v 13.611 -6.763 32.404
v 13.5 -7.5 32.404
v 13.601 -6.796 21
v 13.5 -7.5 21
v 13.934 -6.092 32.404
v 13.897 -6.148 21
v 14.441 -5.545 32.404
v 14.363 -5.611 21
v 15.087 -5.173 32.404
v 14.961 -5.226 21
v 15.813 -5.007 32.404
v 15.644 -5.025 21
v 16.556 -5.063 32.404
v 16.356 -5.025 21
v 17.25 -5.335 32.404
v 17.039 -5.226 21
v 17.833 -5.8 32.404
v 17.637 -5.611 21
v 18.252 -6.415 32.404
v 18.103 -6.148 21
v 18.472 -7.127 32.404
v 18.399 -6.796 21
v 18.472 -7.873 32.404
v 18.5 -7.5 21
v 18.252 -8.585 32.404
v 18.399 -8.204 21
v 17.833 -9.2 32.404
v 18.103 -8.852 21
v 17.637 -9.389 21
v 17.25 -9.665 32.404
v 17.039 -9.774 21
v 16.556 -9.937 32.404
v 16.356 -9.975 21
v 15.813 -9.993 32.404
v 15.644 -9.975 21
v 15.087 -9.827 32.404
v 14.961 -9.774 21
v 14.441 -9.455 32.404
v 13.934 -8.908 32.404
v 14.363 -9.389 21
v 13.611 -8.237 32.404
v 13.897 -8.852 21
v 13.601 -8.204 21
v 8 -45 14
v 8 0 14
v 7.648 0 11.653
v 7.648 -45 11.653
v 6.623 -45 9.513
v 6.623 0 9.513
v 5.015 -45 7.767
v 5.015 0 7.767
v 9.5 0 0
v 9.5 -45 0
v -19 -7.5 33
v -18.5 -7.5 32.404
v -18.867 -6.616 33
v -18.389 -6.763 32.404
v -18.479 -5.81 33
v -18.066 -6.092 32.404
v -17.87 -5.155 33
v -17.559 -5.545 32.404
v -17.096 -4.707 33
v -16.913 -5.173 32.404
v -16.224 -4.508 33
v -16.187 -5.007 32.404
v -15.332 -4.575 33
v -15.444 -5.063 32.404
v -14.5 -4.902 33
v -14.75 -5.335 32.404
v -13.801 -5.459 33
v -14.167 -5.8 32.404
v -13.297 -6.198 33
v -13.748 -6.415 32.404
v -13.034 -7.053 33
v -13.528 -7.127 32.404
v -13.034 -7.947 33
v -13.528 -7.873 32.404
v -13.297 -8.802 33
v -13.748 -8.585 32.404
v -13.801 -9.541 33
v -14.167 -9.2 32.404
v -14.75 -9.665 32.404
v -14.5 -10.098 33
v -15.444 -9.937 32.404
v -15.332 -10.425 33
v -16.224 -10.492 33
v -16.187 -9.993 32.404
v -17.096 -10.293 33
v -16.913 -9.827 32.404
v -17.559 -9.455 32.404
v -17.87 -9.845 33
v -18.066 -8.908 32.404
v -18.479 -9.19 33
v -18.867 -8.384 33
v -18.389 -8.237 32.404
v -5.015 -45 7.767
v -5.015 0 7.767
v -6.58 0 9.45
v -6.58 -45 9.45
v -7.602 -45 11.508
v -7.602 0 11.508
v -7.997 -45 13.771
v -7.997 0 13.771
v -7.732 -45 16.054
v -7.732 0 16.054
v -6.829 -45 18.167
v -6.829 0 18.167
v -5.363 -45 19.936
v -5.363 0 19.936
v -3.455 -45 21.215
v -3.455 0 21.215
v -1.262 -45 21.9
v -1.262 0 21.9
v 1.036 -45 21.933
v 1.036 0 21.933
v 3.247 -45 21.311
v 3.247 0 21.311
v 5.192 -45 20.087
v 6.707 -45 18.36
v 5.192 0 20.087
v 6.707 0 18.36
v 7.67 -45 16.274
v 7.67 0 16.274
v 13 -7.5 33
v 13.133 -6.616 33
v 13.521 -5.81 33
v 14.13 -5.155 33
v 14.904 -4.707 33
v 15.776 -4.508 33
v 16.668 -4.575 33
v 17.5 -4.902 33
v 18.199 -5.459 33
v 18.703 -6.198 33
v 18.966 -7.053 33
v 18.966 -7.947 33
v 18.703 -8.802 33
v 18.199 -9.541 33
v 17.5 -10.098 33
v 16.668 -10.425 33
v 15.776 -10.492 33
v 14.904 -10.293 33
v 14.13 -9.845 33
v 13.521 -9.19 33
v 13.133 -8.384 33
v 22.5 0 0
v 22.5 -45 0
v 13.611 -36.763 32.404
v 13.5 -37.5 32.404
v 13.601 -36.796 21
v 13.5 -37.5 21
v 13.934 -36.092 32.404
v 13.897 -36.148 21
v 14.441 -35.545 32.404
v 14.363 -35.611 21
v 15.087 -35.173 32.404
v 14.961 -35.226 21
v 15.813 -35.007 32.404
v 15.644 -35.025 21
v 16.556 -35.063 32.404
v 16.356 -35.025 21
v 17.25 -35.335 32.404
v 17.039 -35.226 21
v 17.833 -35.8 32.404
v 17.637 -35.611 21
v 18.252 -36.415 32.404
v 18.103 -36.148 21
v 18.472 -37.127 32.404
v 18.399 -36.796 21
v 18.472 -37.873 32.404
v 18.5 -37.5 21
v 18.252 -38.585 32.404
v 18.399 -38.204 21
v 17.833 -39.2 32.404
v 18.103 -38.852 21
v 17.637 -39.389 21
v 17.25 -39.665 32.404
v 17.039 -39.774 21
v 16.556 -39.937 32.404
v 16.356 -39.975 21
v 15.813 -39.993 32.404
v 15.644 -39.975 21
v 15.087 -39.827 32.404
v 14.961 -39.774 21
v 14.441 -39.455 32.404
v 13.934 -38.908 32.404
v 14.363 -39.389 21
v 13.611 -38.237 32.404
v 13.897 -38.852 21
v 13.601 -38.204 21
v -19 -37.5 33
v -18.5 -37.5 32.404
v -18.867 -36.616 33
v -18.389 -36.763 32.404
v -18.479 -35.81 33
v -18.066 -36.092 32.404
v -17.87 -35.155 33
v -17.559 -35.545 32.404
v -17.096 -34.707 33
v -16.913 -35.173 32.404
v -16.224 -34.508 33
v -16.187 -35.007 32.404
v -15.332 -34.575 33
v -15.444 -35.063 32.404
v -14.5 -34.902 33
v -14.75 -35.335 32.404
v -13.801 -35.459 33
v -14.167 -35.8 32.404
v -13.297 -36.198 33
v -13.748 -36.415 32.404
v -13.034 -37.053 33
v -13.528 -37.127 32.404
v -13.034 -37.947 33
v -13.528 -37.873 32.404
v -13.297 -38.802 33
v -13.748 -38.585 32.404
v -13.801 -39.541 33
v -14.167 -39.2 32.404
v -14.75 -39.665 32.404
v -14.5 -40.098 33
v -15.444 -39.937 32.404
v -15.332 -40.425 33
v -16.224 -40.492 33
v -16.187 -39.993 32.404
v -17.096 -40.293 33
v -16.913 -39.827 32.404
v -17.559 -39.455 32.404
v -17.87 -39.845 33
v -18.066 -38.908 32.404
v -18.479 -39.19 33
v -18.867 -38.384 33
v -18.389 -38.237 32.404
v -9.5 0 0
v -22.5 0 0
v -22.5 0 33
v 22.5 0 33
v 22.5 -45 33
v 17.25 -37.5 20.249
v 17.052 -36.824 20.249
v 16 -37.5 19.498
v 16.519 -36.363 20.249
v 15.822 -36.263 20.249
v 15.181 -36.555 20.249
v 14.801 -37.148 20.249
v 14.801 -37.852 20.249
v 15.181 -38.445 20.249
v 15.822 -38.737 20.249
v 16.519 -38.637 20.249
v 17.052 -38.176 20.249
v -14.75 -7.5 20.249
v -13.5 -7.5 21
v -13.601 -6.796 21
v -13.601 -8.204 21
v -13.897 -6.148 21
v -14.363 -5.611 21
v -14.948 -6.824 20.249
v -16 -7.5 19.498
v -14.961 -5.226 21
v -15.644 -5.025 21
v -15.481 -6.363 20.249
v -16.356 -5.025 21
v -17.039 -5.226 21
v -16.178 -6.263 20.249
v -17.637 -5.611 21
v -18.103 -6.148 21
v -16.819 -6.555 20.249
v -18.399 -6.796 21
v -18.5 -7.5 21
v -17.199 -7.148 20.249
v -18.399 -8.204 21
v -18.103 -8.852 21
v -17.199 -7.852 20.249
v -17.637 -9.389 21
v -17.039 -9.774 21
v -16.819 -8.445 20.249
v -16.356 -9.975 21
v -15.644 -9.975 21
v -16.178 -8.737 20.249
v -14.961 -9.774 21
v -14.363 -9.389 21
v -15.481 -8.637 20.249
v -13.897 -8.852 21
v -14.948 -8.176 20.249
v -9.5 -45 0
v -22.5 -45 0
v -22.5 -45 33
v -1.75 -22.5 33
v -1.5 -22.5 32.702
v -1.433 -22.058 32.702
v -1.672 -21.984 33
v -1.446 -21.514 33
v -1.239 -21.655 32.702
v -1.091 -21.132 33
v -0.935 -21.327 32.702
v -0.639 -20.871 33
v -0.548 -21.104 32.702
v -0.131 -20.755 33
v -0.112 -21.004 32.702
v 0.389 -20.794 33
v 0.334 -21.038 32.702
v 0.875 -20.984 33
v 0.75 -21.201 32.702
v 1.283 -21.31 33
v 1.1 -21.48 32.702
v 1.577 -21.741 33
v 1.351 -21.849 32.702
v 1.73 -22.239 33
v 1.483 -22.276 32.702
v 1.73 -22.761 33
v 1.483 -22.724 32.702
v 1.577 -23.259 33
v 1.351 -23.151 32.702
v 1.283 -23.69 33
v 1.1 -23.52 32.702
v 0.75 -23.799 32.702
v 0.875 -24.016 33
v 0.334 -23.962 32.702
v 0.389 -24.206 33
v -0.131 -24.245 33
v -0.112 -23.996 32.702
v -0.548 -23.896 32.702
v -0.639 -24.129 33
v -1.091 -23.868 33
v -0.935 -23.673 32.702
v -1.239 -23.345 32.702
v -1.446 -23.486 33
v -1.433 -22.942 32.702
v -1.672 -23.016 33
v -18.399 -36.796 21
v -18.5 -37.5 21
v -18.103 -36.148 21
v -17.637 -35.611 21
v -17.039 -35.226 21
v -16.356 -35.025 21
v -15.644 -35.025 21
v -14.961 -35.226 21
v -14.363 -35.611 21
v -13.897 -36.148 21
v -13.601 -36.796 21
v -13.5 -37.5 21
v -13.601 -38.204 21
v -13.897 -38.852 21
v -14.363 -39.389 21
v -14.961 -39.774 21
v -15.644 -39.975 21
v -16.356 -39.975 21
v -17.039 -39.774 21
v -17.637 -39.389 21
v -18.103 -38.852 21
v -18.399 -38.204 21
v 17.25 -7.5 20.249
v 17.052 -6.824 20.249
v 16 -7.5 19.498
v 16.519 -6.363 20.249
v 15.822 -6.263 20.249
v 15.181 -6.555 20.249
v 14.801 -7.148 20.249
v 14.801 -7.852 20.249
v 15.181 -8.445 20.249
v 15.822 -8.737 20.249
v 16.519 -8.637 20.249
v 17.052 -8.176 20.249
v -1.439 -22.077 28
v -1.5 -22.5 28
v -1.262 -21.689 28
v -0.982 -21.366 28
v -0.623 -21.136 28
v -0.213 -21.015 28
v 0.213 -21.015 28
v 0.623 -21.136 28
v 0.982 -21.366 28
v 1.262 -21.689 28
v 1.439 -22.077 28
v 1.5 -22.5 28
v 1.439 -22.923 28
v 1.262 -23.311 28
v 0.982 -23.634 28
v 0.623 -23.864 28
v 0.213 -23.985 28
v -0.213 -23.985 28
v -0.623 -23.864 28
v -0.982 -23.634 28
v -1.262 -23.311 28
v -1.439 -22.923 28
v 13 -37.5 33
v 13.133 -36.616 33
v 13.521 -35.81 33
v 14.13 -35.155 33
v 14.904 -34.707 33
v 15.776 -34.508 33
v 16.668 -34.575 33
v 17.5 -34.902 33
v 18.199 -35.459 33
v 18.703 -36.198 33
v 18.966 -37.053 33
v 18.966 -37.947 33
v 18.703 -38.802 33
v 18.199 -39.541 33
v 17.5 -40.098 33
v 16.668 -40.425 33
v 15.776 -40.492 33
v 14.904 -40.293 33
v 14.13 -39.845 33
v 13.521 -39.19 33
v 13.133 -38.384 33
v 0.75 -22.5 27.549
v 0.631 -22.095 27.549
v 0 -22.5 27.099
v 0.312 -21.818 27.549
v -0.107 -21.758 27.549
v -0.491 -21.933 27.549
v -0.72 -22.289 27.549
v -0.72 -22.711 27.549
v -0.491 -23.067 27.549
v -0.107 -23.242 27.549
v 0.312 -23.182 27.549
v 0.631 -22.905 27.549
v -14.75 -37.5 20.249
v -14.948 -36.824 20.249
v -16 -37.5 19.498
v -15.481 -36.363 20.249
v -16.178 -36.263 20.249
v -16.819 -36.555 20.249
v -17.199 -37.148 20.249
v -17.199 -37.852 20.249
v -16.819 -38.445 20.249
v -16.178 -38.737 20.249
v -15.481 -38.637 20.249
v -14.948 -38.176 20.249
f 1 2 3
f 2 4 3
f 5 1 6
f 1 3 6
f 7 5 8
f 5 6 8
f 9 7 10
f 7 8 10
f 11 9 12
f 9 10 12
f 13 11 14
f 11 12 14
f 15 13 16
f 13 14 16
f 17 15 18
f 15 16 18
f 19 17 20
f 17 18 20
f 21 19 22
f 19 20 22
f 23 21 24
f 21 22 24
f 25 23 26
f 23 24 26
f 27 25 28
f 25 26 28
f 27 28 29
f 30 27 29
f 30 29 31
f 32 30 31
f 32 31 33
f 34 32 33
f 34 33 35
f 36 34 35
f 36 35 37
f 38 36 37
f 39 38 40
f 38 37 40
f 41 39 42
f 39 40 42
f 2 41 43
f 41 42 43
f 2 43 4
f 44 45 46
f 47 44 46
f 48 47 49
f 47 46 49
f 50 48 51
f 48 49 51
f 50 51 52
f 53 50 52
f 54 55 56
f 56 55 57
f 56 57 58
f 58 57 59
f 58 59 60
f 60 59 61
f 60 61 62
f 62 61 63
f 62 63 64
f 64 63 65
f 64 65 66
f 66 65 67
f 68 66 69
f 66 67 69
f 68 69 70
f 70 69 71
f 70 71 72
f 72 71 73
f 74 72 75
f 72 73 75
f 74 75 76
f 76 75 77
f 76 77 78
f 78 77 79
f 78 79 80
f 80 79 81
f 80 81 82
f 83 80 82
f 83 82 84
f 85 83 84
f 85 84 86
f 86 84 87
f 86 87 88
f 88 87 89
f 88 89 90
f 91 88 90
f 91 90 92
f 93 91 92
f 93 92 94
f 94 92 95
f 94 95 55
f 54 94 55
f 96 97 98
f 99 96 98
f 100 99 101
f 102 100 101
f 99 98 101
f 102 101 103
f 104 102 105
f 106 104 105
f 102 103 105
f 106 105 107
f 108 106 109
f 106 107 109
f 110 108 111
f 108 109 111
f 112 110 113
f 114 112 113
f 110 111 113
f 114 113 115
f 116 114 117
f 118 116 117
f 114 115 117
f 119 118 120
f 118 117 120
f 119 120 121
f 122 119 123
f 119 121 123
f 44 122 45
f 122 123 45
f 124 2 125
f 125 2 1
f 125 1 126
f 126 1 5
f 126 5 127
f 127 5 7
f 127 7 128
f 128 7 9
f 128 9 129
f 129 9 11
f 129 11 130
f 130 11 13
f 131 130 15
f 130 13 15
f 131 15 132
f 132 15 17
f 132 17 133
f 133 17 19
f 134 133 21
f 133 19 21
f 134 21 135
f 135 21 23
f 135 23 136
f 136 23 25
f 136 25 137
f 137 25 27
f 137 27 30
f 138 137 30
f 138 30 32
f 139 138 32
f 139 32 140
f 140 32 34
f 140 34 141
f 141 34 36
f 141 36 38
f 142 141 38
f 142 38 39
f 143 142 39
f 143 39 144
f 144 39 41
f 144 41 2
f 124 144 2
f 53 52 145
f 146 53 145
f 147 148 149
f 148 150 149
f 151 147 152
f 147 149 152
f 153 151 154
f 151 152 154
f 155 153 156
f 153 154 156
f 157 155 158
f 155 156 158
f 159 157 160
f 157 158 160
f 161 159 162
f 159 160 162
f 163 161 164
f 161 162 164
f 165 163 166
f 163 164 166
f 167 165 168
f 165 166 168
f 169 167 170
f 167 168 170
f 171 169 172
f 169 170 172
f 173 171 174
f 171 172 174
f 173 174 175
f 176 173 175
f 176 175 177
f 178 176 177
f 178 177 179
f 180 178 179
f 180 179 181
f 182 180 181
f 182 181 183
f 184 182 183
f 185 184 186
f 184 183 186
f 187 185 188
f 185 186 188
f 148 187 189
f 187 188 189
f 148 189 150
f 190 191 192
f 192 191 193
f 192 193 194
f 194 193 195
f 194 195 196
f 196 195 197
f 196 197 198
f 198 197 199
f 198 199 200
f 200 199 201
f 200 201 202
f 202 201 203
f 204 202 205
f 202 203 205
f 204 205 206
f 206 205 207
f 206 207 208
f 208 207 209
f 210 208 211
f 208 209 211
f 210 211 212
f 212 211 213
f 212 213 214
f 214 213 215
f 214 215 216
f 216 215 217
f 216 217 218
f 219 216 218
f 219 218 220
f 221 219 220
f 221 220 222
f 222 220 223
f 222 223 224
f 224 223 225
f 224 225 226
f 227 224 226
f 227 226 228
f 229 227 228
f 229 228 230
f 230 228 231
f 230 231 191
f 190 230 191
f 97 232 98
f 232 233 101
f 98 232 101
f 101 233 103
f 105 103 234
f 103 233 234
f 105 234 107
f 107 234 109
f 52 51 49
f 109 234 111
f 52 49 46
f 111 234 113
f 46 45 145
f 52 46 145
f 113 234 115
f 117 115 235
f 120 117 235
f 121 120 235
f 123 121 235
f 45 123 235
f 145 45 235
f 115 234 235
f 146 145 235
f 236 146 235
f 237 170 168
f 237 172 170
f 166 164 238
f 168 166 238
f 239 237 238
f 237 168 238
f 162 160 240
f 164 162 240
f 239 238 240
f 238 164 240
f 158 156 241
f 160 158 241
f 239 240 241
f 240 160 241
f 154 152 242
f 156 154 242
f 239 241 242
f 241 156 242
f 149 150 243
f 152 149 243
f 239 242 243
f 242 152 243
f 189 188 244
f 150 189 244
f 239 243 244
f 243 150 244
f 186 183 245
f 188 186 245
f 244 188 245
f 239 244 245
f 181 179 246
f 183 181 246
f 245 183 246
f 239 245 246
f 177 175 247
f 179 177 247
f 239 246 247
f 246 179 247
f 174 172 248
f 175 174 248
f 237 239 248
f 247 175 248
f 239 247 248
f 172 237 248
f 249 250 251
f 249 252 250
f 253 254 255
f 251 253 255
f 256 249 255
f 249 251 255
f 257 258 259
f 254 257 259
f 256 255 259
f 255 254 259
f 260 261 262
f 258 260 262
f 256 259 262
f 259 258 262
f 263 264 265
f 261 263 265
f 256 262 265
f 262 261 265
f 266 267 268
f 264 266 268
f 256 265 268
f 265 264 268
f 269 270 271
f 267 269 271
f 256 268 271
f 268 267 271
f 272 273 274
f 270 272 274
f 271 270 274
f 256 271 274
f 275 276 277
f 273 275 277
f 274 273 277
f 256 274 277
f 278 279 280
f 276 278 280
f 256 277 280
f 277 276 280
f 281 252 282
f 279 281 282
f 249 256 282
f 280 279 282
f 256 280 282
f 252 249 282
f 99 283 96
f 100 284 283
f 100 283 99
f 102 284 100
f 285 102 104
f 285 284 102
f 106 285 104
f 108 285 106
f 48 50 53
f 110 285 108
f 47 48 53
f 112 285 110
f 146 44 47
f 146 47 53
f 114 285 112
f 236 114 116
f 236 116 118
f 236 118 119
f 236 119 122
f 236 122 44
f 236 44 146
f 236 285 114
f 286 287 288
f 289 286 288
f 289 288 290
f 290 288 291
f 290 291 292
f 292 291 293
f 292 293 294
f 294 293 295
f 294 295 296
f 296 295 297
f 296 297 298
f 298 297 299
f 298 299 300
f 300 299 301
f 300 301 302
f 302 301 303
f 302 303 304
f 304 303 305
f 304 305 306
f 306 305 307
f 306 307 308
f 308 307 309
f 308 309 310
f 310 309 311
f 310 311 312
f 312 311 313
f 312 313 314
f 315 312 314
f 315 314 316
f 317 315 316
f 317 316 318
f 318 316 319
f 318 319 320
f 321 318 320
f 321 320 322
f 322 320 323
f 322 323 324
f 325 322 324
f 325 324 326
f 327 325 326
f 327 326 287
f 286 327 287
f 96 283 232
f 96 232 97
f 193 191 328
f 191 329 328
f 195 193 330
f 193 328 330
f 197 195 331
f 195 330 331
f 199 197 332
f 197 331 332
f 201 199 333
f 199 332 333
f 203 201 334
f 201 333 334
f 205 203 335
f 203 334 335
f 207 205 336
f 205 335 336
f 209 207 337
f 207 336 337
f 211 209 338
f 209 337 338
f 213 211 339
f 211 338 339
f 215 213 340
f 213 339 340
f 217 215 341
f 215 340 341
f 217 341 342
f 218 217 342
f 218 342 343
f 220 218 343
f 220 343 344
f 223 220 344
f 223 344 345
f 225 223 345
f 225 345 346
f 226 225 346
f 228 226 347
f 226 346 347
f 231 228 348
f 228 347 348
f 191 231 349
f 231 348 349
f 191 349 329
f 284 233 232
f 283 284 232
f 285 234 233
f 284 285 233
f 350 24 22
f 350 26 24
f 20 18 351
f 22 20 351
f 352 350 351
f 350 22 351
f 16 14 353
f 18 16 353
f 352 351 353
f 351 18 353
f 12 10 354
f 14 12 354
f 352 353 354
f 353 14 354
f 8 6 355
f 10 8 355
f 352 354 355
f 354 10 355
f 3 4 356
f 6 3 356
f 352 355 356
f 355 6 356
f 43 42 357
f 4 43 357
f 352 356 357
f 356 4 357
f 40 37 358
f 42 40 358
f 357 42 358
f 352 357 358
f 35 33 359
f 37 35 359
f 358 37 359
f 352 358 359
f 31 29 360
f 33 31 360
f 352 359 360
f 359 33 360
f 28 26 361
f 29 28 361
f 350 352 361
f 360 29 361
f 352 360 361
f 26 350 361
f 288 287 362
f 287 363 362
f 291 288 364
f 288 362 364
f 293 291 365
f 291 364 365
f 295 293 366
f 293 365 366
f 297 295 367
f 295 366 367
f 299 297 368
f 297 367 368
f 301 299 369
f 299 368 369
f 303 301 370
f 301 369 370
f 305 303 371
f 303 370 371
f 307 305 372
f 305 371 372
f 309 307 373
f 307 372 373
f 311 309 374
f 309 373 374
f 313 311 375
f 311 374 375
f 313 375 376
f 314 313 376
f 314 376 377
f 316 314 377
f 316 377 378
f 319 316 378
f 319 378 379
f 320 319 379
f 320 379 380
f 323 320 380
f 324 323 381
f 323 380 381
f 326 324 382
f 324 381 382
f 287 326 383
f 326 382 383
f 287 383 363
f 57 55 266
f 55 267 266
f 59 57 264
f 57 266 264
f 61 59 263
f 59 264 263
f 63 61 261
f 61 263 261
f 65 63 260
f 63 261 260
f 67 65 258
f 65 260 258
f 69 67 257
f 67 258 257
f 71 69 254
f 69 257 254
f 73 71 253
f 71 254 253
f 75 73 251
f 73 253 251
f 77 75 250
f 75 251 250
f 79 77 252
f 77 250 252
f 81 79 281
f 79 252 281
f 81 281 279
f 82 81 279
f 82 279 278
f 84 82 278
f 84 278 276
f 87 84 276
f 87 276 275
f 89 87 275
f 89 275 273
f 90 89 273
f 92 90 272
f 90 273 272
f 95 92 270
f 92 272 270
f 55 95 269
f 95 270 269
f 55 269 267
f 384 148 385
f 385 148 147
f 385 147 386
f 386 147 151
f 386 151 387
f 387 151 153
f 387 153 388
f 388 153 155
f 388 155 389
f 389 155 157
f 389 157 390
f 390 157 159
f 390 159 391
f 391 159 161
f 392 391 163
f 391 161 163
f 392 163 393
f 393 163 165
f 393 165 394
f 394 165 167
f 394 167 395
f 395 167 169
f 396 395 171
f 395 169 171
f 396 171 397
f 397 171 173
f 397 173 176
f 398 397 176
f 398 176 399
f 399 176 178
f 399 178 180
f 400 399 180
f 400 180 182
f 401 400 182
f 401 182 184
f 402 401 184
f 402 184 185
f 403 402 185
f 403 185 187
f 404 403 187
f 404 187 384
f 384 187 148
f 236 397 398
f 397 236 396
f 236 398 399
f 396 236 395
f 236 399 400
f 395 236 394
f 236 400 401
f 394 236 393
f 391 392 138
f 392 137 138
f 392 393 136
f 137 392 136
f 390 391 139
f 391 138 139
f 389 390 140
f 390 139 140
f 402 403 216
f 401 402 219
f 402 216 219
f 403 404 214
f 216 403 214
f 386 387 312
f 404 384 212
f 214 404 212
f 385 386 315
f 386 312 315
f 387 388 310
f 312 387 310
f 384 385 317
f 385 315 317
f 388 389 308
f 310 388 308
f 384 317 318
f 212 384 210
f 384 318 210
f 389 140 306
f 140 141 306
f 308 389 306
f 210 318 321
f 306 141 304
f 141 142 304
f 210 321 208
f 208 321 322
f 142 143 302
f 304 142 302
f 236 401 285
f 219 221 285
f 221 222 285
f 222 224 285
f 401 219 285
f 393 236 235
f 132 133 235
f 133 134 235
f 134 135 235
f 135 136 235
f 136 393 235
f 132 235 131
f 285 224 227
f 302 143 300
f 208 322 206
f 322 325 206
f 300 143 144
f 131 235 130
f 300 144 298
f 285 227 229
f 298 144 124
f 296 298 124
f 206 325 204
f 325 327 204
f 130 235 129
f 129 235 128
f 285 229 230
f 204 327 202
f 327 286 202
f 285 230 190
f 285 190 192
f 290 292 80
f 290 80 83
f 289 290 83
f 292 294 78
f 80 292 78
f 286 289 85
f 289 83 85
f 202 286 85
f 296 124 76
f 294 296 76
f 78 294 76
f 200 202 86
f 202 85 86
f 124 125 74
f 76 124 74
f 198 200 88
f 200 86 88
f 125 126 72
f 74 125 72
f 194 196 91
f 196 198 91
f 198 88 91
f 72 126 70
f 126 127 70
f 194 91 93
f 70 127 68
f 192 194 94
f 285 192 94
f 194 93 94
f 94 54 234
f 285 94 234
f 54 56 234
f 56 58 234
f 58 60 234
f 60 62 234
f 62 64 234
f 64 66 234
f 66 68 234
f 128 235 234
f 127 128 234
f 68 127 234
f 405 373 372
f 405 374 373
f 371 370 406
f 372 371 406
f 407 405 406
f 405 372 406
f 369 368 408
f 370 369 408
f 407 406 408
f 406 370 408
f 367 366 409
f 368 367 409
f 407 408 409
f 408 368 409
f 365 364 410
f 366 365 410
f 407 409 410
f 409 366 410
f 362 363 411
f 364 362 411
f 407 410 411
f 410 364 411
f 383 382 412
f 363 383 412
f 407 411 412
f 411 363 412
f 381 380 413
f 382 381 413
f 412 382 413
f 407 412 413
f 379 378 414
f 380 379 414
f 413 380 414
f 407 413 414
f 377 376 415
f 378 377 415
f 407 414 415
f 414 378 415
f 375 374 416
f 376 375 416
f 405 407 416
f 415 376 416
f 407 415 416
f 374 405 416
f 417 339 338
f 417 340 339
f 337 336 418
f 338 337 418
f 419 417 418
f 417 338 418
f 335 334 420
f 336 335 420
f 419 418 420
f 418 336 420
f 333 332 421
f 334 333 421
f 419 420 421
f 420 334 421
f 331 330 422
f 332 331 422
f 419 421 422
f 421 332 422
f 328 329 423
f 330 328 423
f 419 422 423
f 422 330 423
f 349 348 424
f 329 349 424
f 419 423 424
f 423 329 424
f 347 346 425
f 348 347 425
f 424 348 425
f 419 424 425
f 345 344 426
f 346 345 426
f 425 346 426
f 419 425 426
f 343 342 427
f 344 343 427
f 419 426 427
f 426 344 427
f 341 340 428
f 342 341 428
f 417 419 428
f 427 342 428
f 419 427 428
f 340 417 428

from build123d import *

# Parameters (mm, degrees)
F1_DEPTH       = 45
F5_D           = 5
F5_DEPTH       = 12
F5_CSINK_D     = 6
F5_CSINK_ANGLE = 80
F5_TIP         = 1.5021515476
F6_D           = 3
F6_DEPTH       = 5
F6_CSINK_D     = 3.5
F6_CSINK_ANGLE = 80
F6_TIP         = 0.9012909285


with BuildPart() as f1:
    # F0 (on Front) → F1 (new body)
    with BuildSketch(Plane.XZ):
        with BuildLine():
            Line((9.5, 0), (22.5, 0))
            Line((22.5, 0), (22.5, 33))
            Line((22.5, 33), (0, 33))
            Line((0, 33), (-22.5, 33))
            Line((-22.5, 33), (-22.5, 0))
            Line((-22.5, 0), (-9.5, 0))
            Line((-9.5, 0), (-5.0154756716, 7.7674239846))
            ThreePointArc((-5.0154756716, 7.7674239846), (-3.4551551794, 21.2153934533), (8, 14))
            ThreePointArc((8, 14), (7.2153934533, 10.5448448206), (5.0154756716, 7.7674239846))
            Line((5.0154756716, 7.7674239846), (9.5, 0))
        make_face()
    extrude(amount=F1_DEPTH)

    # F5
    with Locations(Plane.XY.offset(33)):
        with Locations((-16, -7.5), (-16, -37.5), (16, -37.5), (16, -7.5)):
            CounterSinkHole(F5_D / 2, F5_CSINK_D / 2, depth=F5_DEPTH, counter_sink_angle=F5_CSINK_ANGLE)
            with Locations((0, 0, -(F5_DEPTH + F5_TIP / 2))):  # 118° drill point
                Cone(0, F5_D / 2, F5_TIP, mode=Mode.SUBTRACT)

    # F6
    with Locations(Plane.XY.offset(33)):
        with Locations((0, -22.5)):
            CounterSinkHole(F6_D / 2, F6_CSINK_D / 2, depth=F6_DEPTH, counter_sink_angle=F6_CSINK_ANGLE)
            with Locations((0, 0, -(F6_DEPTH + F6_TIP / 2))):  # 118° drill point
                Cone(0, F6_D / 2, F6_TIP, mode=Mode.SUBTRACT)


solid = f1.part
